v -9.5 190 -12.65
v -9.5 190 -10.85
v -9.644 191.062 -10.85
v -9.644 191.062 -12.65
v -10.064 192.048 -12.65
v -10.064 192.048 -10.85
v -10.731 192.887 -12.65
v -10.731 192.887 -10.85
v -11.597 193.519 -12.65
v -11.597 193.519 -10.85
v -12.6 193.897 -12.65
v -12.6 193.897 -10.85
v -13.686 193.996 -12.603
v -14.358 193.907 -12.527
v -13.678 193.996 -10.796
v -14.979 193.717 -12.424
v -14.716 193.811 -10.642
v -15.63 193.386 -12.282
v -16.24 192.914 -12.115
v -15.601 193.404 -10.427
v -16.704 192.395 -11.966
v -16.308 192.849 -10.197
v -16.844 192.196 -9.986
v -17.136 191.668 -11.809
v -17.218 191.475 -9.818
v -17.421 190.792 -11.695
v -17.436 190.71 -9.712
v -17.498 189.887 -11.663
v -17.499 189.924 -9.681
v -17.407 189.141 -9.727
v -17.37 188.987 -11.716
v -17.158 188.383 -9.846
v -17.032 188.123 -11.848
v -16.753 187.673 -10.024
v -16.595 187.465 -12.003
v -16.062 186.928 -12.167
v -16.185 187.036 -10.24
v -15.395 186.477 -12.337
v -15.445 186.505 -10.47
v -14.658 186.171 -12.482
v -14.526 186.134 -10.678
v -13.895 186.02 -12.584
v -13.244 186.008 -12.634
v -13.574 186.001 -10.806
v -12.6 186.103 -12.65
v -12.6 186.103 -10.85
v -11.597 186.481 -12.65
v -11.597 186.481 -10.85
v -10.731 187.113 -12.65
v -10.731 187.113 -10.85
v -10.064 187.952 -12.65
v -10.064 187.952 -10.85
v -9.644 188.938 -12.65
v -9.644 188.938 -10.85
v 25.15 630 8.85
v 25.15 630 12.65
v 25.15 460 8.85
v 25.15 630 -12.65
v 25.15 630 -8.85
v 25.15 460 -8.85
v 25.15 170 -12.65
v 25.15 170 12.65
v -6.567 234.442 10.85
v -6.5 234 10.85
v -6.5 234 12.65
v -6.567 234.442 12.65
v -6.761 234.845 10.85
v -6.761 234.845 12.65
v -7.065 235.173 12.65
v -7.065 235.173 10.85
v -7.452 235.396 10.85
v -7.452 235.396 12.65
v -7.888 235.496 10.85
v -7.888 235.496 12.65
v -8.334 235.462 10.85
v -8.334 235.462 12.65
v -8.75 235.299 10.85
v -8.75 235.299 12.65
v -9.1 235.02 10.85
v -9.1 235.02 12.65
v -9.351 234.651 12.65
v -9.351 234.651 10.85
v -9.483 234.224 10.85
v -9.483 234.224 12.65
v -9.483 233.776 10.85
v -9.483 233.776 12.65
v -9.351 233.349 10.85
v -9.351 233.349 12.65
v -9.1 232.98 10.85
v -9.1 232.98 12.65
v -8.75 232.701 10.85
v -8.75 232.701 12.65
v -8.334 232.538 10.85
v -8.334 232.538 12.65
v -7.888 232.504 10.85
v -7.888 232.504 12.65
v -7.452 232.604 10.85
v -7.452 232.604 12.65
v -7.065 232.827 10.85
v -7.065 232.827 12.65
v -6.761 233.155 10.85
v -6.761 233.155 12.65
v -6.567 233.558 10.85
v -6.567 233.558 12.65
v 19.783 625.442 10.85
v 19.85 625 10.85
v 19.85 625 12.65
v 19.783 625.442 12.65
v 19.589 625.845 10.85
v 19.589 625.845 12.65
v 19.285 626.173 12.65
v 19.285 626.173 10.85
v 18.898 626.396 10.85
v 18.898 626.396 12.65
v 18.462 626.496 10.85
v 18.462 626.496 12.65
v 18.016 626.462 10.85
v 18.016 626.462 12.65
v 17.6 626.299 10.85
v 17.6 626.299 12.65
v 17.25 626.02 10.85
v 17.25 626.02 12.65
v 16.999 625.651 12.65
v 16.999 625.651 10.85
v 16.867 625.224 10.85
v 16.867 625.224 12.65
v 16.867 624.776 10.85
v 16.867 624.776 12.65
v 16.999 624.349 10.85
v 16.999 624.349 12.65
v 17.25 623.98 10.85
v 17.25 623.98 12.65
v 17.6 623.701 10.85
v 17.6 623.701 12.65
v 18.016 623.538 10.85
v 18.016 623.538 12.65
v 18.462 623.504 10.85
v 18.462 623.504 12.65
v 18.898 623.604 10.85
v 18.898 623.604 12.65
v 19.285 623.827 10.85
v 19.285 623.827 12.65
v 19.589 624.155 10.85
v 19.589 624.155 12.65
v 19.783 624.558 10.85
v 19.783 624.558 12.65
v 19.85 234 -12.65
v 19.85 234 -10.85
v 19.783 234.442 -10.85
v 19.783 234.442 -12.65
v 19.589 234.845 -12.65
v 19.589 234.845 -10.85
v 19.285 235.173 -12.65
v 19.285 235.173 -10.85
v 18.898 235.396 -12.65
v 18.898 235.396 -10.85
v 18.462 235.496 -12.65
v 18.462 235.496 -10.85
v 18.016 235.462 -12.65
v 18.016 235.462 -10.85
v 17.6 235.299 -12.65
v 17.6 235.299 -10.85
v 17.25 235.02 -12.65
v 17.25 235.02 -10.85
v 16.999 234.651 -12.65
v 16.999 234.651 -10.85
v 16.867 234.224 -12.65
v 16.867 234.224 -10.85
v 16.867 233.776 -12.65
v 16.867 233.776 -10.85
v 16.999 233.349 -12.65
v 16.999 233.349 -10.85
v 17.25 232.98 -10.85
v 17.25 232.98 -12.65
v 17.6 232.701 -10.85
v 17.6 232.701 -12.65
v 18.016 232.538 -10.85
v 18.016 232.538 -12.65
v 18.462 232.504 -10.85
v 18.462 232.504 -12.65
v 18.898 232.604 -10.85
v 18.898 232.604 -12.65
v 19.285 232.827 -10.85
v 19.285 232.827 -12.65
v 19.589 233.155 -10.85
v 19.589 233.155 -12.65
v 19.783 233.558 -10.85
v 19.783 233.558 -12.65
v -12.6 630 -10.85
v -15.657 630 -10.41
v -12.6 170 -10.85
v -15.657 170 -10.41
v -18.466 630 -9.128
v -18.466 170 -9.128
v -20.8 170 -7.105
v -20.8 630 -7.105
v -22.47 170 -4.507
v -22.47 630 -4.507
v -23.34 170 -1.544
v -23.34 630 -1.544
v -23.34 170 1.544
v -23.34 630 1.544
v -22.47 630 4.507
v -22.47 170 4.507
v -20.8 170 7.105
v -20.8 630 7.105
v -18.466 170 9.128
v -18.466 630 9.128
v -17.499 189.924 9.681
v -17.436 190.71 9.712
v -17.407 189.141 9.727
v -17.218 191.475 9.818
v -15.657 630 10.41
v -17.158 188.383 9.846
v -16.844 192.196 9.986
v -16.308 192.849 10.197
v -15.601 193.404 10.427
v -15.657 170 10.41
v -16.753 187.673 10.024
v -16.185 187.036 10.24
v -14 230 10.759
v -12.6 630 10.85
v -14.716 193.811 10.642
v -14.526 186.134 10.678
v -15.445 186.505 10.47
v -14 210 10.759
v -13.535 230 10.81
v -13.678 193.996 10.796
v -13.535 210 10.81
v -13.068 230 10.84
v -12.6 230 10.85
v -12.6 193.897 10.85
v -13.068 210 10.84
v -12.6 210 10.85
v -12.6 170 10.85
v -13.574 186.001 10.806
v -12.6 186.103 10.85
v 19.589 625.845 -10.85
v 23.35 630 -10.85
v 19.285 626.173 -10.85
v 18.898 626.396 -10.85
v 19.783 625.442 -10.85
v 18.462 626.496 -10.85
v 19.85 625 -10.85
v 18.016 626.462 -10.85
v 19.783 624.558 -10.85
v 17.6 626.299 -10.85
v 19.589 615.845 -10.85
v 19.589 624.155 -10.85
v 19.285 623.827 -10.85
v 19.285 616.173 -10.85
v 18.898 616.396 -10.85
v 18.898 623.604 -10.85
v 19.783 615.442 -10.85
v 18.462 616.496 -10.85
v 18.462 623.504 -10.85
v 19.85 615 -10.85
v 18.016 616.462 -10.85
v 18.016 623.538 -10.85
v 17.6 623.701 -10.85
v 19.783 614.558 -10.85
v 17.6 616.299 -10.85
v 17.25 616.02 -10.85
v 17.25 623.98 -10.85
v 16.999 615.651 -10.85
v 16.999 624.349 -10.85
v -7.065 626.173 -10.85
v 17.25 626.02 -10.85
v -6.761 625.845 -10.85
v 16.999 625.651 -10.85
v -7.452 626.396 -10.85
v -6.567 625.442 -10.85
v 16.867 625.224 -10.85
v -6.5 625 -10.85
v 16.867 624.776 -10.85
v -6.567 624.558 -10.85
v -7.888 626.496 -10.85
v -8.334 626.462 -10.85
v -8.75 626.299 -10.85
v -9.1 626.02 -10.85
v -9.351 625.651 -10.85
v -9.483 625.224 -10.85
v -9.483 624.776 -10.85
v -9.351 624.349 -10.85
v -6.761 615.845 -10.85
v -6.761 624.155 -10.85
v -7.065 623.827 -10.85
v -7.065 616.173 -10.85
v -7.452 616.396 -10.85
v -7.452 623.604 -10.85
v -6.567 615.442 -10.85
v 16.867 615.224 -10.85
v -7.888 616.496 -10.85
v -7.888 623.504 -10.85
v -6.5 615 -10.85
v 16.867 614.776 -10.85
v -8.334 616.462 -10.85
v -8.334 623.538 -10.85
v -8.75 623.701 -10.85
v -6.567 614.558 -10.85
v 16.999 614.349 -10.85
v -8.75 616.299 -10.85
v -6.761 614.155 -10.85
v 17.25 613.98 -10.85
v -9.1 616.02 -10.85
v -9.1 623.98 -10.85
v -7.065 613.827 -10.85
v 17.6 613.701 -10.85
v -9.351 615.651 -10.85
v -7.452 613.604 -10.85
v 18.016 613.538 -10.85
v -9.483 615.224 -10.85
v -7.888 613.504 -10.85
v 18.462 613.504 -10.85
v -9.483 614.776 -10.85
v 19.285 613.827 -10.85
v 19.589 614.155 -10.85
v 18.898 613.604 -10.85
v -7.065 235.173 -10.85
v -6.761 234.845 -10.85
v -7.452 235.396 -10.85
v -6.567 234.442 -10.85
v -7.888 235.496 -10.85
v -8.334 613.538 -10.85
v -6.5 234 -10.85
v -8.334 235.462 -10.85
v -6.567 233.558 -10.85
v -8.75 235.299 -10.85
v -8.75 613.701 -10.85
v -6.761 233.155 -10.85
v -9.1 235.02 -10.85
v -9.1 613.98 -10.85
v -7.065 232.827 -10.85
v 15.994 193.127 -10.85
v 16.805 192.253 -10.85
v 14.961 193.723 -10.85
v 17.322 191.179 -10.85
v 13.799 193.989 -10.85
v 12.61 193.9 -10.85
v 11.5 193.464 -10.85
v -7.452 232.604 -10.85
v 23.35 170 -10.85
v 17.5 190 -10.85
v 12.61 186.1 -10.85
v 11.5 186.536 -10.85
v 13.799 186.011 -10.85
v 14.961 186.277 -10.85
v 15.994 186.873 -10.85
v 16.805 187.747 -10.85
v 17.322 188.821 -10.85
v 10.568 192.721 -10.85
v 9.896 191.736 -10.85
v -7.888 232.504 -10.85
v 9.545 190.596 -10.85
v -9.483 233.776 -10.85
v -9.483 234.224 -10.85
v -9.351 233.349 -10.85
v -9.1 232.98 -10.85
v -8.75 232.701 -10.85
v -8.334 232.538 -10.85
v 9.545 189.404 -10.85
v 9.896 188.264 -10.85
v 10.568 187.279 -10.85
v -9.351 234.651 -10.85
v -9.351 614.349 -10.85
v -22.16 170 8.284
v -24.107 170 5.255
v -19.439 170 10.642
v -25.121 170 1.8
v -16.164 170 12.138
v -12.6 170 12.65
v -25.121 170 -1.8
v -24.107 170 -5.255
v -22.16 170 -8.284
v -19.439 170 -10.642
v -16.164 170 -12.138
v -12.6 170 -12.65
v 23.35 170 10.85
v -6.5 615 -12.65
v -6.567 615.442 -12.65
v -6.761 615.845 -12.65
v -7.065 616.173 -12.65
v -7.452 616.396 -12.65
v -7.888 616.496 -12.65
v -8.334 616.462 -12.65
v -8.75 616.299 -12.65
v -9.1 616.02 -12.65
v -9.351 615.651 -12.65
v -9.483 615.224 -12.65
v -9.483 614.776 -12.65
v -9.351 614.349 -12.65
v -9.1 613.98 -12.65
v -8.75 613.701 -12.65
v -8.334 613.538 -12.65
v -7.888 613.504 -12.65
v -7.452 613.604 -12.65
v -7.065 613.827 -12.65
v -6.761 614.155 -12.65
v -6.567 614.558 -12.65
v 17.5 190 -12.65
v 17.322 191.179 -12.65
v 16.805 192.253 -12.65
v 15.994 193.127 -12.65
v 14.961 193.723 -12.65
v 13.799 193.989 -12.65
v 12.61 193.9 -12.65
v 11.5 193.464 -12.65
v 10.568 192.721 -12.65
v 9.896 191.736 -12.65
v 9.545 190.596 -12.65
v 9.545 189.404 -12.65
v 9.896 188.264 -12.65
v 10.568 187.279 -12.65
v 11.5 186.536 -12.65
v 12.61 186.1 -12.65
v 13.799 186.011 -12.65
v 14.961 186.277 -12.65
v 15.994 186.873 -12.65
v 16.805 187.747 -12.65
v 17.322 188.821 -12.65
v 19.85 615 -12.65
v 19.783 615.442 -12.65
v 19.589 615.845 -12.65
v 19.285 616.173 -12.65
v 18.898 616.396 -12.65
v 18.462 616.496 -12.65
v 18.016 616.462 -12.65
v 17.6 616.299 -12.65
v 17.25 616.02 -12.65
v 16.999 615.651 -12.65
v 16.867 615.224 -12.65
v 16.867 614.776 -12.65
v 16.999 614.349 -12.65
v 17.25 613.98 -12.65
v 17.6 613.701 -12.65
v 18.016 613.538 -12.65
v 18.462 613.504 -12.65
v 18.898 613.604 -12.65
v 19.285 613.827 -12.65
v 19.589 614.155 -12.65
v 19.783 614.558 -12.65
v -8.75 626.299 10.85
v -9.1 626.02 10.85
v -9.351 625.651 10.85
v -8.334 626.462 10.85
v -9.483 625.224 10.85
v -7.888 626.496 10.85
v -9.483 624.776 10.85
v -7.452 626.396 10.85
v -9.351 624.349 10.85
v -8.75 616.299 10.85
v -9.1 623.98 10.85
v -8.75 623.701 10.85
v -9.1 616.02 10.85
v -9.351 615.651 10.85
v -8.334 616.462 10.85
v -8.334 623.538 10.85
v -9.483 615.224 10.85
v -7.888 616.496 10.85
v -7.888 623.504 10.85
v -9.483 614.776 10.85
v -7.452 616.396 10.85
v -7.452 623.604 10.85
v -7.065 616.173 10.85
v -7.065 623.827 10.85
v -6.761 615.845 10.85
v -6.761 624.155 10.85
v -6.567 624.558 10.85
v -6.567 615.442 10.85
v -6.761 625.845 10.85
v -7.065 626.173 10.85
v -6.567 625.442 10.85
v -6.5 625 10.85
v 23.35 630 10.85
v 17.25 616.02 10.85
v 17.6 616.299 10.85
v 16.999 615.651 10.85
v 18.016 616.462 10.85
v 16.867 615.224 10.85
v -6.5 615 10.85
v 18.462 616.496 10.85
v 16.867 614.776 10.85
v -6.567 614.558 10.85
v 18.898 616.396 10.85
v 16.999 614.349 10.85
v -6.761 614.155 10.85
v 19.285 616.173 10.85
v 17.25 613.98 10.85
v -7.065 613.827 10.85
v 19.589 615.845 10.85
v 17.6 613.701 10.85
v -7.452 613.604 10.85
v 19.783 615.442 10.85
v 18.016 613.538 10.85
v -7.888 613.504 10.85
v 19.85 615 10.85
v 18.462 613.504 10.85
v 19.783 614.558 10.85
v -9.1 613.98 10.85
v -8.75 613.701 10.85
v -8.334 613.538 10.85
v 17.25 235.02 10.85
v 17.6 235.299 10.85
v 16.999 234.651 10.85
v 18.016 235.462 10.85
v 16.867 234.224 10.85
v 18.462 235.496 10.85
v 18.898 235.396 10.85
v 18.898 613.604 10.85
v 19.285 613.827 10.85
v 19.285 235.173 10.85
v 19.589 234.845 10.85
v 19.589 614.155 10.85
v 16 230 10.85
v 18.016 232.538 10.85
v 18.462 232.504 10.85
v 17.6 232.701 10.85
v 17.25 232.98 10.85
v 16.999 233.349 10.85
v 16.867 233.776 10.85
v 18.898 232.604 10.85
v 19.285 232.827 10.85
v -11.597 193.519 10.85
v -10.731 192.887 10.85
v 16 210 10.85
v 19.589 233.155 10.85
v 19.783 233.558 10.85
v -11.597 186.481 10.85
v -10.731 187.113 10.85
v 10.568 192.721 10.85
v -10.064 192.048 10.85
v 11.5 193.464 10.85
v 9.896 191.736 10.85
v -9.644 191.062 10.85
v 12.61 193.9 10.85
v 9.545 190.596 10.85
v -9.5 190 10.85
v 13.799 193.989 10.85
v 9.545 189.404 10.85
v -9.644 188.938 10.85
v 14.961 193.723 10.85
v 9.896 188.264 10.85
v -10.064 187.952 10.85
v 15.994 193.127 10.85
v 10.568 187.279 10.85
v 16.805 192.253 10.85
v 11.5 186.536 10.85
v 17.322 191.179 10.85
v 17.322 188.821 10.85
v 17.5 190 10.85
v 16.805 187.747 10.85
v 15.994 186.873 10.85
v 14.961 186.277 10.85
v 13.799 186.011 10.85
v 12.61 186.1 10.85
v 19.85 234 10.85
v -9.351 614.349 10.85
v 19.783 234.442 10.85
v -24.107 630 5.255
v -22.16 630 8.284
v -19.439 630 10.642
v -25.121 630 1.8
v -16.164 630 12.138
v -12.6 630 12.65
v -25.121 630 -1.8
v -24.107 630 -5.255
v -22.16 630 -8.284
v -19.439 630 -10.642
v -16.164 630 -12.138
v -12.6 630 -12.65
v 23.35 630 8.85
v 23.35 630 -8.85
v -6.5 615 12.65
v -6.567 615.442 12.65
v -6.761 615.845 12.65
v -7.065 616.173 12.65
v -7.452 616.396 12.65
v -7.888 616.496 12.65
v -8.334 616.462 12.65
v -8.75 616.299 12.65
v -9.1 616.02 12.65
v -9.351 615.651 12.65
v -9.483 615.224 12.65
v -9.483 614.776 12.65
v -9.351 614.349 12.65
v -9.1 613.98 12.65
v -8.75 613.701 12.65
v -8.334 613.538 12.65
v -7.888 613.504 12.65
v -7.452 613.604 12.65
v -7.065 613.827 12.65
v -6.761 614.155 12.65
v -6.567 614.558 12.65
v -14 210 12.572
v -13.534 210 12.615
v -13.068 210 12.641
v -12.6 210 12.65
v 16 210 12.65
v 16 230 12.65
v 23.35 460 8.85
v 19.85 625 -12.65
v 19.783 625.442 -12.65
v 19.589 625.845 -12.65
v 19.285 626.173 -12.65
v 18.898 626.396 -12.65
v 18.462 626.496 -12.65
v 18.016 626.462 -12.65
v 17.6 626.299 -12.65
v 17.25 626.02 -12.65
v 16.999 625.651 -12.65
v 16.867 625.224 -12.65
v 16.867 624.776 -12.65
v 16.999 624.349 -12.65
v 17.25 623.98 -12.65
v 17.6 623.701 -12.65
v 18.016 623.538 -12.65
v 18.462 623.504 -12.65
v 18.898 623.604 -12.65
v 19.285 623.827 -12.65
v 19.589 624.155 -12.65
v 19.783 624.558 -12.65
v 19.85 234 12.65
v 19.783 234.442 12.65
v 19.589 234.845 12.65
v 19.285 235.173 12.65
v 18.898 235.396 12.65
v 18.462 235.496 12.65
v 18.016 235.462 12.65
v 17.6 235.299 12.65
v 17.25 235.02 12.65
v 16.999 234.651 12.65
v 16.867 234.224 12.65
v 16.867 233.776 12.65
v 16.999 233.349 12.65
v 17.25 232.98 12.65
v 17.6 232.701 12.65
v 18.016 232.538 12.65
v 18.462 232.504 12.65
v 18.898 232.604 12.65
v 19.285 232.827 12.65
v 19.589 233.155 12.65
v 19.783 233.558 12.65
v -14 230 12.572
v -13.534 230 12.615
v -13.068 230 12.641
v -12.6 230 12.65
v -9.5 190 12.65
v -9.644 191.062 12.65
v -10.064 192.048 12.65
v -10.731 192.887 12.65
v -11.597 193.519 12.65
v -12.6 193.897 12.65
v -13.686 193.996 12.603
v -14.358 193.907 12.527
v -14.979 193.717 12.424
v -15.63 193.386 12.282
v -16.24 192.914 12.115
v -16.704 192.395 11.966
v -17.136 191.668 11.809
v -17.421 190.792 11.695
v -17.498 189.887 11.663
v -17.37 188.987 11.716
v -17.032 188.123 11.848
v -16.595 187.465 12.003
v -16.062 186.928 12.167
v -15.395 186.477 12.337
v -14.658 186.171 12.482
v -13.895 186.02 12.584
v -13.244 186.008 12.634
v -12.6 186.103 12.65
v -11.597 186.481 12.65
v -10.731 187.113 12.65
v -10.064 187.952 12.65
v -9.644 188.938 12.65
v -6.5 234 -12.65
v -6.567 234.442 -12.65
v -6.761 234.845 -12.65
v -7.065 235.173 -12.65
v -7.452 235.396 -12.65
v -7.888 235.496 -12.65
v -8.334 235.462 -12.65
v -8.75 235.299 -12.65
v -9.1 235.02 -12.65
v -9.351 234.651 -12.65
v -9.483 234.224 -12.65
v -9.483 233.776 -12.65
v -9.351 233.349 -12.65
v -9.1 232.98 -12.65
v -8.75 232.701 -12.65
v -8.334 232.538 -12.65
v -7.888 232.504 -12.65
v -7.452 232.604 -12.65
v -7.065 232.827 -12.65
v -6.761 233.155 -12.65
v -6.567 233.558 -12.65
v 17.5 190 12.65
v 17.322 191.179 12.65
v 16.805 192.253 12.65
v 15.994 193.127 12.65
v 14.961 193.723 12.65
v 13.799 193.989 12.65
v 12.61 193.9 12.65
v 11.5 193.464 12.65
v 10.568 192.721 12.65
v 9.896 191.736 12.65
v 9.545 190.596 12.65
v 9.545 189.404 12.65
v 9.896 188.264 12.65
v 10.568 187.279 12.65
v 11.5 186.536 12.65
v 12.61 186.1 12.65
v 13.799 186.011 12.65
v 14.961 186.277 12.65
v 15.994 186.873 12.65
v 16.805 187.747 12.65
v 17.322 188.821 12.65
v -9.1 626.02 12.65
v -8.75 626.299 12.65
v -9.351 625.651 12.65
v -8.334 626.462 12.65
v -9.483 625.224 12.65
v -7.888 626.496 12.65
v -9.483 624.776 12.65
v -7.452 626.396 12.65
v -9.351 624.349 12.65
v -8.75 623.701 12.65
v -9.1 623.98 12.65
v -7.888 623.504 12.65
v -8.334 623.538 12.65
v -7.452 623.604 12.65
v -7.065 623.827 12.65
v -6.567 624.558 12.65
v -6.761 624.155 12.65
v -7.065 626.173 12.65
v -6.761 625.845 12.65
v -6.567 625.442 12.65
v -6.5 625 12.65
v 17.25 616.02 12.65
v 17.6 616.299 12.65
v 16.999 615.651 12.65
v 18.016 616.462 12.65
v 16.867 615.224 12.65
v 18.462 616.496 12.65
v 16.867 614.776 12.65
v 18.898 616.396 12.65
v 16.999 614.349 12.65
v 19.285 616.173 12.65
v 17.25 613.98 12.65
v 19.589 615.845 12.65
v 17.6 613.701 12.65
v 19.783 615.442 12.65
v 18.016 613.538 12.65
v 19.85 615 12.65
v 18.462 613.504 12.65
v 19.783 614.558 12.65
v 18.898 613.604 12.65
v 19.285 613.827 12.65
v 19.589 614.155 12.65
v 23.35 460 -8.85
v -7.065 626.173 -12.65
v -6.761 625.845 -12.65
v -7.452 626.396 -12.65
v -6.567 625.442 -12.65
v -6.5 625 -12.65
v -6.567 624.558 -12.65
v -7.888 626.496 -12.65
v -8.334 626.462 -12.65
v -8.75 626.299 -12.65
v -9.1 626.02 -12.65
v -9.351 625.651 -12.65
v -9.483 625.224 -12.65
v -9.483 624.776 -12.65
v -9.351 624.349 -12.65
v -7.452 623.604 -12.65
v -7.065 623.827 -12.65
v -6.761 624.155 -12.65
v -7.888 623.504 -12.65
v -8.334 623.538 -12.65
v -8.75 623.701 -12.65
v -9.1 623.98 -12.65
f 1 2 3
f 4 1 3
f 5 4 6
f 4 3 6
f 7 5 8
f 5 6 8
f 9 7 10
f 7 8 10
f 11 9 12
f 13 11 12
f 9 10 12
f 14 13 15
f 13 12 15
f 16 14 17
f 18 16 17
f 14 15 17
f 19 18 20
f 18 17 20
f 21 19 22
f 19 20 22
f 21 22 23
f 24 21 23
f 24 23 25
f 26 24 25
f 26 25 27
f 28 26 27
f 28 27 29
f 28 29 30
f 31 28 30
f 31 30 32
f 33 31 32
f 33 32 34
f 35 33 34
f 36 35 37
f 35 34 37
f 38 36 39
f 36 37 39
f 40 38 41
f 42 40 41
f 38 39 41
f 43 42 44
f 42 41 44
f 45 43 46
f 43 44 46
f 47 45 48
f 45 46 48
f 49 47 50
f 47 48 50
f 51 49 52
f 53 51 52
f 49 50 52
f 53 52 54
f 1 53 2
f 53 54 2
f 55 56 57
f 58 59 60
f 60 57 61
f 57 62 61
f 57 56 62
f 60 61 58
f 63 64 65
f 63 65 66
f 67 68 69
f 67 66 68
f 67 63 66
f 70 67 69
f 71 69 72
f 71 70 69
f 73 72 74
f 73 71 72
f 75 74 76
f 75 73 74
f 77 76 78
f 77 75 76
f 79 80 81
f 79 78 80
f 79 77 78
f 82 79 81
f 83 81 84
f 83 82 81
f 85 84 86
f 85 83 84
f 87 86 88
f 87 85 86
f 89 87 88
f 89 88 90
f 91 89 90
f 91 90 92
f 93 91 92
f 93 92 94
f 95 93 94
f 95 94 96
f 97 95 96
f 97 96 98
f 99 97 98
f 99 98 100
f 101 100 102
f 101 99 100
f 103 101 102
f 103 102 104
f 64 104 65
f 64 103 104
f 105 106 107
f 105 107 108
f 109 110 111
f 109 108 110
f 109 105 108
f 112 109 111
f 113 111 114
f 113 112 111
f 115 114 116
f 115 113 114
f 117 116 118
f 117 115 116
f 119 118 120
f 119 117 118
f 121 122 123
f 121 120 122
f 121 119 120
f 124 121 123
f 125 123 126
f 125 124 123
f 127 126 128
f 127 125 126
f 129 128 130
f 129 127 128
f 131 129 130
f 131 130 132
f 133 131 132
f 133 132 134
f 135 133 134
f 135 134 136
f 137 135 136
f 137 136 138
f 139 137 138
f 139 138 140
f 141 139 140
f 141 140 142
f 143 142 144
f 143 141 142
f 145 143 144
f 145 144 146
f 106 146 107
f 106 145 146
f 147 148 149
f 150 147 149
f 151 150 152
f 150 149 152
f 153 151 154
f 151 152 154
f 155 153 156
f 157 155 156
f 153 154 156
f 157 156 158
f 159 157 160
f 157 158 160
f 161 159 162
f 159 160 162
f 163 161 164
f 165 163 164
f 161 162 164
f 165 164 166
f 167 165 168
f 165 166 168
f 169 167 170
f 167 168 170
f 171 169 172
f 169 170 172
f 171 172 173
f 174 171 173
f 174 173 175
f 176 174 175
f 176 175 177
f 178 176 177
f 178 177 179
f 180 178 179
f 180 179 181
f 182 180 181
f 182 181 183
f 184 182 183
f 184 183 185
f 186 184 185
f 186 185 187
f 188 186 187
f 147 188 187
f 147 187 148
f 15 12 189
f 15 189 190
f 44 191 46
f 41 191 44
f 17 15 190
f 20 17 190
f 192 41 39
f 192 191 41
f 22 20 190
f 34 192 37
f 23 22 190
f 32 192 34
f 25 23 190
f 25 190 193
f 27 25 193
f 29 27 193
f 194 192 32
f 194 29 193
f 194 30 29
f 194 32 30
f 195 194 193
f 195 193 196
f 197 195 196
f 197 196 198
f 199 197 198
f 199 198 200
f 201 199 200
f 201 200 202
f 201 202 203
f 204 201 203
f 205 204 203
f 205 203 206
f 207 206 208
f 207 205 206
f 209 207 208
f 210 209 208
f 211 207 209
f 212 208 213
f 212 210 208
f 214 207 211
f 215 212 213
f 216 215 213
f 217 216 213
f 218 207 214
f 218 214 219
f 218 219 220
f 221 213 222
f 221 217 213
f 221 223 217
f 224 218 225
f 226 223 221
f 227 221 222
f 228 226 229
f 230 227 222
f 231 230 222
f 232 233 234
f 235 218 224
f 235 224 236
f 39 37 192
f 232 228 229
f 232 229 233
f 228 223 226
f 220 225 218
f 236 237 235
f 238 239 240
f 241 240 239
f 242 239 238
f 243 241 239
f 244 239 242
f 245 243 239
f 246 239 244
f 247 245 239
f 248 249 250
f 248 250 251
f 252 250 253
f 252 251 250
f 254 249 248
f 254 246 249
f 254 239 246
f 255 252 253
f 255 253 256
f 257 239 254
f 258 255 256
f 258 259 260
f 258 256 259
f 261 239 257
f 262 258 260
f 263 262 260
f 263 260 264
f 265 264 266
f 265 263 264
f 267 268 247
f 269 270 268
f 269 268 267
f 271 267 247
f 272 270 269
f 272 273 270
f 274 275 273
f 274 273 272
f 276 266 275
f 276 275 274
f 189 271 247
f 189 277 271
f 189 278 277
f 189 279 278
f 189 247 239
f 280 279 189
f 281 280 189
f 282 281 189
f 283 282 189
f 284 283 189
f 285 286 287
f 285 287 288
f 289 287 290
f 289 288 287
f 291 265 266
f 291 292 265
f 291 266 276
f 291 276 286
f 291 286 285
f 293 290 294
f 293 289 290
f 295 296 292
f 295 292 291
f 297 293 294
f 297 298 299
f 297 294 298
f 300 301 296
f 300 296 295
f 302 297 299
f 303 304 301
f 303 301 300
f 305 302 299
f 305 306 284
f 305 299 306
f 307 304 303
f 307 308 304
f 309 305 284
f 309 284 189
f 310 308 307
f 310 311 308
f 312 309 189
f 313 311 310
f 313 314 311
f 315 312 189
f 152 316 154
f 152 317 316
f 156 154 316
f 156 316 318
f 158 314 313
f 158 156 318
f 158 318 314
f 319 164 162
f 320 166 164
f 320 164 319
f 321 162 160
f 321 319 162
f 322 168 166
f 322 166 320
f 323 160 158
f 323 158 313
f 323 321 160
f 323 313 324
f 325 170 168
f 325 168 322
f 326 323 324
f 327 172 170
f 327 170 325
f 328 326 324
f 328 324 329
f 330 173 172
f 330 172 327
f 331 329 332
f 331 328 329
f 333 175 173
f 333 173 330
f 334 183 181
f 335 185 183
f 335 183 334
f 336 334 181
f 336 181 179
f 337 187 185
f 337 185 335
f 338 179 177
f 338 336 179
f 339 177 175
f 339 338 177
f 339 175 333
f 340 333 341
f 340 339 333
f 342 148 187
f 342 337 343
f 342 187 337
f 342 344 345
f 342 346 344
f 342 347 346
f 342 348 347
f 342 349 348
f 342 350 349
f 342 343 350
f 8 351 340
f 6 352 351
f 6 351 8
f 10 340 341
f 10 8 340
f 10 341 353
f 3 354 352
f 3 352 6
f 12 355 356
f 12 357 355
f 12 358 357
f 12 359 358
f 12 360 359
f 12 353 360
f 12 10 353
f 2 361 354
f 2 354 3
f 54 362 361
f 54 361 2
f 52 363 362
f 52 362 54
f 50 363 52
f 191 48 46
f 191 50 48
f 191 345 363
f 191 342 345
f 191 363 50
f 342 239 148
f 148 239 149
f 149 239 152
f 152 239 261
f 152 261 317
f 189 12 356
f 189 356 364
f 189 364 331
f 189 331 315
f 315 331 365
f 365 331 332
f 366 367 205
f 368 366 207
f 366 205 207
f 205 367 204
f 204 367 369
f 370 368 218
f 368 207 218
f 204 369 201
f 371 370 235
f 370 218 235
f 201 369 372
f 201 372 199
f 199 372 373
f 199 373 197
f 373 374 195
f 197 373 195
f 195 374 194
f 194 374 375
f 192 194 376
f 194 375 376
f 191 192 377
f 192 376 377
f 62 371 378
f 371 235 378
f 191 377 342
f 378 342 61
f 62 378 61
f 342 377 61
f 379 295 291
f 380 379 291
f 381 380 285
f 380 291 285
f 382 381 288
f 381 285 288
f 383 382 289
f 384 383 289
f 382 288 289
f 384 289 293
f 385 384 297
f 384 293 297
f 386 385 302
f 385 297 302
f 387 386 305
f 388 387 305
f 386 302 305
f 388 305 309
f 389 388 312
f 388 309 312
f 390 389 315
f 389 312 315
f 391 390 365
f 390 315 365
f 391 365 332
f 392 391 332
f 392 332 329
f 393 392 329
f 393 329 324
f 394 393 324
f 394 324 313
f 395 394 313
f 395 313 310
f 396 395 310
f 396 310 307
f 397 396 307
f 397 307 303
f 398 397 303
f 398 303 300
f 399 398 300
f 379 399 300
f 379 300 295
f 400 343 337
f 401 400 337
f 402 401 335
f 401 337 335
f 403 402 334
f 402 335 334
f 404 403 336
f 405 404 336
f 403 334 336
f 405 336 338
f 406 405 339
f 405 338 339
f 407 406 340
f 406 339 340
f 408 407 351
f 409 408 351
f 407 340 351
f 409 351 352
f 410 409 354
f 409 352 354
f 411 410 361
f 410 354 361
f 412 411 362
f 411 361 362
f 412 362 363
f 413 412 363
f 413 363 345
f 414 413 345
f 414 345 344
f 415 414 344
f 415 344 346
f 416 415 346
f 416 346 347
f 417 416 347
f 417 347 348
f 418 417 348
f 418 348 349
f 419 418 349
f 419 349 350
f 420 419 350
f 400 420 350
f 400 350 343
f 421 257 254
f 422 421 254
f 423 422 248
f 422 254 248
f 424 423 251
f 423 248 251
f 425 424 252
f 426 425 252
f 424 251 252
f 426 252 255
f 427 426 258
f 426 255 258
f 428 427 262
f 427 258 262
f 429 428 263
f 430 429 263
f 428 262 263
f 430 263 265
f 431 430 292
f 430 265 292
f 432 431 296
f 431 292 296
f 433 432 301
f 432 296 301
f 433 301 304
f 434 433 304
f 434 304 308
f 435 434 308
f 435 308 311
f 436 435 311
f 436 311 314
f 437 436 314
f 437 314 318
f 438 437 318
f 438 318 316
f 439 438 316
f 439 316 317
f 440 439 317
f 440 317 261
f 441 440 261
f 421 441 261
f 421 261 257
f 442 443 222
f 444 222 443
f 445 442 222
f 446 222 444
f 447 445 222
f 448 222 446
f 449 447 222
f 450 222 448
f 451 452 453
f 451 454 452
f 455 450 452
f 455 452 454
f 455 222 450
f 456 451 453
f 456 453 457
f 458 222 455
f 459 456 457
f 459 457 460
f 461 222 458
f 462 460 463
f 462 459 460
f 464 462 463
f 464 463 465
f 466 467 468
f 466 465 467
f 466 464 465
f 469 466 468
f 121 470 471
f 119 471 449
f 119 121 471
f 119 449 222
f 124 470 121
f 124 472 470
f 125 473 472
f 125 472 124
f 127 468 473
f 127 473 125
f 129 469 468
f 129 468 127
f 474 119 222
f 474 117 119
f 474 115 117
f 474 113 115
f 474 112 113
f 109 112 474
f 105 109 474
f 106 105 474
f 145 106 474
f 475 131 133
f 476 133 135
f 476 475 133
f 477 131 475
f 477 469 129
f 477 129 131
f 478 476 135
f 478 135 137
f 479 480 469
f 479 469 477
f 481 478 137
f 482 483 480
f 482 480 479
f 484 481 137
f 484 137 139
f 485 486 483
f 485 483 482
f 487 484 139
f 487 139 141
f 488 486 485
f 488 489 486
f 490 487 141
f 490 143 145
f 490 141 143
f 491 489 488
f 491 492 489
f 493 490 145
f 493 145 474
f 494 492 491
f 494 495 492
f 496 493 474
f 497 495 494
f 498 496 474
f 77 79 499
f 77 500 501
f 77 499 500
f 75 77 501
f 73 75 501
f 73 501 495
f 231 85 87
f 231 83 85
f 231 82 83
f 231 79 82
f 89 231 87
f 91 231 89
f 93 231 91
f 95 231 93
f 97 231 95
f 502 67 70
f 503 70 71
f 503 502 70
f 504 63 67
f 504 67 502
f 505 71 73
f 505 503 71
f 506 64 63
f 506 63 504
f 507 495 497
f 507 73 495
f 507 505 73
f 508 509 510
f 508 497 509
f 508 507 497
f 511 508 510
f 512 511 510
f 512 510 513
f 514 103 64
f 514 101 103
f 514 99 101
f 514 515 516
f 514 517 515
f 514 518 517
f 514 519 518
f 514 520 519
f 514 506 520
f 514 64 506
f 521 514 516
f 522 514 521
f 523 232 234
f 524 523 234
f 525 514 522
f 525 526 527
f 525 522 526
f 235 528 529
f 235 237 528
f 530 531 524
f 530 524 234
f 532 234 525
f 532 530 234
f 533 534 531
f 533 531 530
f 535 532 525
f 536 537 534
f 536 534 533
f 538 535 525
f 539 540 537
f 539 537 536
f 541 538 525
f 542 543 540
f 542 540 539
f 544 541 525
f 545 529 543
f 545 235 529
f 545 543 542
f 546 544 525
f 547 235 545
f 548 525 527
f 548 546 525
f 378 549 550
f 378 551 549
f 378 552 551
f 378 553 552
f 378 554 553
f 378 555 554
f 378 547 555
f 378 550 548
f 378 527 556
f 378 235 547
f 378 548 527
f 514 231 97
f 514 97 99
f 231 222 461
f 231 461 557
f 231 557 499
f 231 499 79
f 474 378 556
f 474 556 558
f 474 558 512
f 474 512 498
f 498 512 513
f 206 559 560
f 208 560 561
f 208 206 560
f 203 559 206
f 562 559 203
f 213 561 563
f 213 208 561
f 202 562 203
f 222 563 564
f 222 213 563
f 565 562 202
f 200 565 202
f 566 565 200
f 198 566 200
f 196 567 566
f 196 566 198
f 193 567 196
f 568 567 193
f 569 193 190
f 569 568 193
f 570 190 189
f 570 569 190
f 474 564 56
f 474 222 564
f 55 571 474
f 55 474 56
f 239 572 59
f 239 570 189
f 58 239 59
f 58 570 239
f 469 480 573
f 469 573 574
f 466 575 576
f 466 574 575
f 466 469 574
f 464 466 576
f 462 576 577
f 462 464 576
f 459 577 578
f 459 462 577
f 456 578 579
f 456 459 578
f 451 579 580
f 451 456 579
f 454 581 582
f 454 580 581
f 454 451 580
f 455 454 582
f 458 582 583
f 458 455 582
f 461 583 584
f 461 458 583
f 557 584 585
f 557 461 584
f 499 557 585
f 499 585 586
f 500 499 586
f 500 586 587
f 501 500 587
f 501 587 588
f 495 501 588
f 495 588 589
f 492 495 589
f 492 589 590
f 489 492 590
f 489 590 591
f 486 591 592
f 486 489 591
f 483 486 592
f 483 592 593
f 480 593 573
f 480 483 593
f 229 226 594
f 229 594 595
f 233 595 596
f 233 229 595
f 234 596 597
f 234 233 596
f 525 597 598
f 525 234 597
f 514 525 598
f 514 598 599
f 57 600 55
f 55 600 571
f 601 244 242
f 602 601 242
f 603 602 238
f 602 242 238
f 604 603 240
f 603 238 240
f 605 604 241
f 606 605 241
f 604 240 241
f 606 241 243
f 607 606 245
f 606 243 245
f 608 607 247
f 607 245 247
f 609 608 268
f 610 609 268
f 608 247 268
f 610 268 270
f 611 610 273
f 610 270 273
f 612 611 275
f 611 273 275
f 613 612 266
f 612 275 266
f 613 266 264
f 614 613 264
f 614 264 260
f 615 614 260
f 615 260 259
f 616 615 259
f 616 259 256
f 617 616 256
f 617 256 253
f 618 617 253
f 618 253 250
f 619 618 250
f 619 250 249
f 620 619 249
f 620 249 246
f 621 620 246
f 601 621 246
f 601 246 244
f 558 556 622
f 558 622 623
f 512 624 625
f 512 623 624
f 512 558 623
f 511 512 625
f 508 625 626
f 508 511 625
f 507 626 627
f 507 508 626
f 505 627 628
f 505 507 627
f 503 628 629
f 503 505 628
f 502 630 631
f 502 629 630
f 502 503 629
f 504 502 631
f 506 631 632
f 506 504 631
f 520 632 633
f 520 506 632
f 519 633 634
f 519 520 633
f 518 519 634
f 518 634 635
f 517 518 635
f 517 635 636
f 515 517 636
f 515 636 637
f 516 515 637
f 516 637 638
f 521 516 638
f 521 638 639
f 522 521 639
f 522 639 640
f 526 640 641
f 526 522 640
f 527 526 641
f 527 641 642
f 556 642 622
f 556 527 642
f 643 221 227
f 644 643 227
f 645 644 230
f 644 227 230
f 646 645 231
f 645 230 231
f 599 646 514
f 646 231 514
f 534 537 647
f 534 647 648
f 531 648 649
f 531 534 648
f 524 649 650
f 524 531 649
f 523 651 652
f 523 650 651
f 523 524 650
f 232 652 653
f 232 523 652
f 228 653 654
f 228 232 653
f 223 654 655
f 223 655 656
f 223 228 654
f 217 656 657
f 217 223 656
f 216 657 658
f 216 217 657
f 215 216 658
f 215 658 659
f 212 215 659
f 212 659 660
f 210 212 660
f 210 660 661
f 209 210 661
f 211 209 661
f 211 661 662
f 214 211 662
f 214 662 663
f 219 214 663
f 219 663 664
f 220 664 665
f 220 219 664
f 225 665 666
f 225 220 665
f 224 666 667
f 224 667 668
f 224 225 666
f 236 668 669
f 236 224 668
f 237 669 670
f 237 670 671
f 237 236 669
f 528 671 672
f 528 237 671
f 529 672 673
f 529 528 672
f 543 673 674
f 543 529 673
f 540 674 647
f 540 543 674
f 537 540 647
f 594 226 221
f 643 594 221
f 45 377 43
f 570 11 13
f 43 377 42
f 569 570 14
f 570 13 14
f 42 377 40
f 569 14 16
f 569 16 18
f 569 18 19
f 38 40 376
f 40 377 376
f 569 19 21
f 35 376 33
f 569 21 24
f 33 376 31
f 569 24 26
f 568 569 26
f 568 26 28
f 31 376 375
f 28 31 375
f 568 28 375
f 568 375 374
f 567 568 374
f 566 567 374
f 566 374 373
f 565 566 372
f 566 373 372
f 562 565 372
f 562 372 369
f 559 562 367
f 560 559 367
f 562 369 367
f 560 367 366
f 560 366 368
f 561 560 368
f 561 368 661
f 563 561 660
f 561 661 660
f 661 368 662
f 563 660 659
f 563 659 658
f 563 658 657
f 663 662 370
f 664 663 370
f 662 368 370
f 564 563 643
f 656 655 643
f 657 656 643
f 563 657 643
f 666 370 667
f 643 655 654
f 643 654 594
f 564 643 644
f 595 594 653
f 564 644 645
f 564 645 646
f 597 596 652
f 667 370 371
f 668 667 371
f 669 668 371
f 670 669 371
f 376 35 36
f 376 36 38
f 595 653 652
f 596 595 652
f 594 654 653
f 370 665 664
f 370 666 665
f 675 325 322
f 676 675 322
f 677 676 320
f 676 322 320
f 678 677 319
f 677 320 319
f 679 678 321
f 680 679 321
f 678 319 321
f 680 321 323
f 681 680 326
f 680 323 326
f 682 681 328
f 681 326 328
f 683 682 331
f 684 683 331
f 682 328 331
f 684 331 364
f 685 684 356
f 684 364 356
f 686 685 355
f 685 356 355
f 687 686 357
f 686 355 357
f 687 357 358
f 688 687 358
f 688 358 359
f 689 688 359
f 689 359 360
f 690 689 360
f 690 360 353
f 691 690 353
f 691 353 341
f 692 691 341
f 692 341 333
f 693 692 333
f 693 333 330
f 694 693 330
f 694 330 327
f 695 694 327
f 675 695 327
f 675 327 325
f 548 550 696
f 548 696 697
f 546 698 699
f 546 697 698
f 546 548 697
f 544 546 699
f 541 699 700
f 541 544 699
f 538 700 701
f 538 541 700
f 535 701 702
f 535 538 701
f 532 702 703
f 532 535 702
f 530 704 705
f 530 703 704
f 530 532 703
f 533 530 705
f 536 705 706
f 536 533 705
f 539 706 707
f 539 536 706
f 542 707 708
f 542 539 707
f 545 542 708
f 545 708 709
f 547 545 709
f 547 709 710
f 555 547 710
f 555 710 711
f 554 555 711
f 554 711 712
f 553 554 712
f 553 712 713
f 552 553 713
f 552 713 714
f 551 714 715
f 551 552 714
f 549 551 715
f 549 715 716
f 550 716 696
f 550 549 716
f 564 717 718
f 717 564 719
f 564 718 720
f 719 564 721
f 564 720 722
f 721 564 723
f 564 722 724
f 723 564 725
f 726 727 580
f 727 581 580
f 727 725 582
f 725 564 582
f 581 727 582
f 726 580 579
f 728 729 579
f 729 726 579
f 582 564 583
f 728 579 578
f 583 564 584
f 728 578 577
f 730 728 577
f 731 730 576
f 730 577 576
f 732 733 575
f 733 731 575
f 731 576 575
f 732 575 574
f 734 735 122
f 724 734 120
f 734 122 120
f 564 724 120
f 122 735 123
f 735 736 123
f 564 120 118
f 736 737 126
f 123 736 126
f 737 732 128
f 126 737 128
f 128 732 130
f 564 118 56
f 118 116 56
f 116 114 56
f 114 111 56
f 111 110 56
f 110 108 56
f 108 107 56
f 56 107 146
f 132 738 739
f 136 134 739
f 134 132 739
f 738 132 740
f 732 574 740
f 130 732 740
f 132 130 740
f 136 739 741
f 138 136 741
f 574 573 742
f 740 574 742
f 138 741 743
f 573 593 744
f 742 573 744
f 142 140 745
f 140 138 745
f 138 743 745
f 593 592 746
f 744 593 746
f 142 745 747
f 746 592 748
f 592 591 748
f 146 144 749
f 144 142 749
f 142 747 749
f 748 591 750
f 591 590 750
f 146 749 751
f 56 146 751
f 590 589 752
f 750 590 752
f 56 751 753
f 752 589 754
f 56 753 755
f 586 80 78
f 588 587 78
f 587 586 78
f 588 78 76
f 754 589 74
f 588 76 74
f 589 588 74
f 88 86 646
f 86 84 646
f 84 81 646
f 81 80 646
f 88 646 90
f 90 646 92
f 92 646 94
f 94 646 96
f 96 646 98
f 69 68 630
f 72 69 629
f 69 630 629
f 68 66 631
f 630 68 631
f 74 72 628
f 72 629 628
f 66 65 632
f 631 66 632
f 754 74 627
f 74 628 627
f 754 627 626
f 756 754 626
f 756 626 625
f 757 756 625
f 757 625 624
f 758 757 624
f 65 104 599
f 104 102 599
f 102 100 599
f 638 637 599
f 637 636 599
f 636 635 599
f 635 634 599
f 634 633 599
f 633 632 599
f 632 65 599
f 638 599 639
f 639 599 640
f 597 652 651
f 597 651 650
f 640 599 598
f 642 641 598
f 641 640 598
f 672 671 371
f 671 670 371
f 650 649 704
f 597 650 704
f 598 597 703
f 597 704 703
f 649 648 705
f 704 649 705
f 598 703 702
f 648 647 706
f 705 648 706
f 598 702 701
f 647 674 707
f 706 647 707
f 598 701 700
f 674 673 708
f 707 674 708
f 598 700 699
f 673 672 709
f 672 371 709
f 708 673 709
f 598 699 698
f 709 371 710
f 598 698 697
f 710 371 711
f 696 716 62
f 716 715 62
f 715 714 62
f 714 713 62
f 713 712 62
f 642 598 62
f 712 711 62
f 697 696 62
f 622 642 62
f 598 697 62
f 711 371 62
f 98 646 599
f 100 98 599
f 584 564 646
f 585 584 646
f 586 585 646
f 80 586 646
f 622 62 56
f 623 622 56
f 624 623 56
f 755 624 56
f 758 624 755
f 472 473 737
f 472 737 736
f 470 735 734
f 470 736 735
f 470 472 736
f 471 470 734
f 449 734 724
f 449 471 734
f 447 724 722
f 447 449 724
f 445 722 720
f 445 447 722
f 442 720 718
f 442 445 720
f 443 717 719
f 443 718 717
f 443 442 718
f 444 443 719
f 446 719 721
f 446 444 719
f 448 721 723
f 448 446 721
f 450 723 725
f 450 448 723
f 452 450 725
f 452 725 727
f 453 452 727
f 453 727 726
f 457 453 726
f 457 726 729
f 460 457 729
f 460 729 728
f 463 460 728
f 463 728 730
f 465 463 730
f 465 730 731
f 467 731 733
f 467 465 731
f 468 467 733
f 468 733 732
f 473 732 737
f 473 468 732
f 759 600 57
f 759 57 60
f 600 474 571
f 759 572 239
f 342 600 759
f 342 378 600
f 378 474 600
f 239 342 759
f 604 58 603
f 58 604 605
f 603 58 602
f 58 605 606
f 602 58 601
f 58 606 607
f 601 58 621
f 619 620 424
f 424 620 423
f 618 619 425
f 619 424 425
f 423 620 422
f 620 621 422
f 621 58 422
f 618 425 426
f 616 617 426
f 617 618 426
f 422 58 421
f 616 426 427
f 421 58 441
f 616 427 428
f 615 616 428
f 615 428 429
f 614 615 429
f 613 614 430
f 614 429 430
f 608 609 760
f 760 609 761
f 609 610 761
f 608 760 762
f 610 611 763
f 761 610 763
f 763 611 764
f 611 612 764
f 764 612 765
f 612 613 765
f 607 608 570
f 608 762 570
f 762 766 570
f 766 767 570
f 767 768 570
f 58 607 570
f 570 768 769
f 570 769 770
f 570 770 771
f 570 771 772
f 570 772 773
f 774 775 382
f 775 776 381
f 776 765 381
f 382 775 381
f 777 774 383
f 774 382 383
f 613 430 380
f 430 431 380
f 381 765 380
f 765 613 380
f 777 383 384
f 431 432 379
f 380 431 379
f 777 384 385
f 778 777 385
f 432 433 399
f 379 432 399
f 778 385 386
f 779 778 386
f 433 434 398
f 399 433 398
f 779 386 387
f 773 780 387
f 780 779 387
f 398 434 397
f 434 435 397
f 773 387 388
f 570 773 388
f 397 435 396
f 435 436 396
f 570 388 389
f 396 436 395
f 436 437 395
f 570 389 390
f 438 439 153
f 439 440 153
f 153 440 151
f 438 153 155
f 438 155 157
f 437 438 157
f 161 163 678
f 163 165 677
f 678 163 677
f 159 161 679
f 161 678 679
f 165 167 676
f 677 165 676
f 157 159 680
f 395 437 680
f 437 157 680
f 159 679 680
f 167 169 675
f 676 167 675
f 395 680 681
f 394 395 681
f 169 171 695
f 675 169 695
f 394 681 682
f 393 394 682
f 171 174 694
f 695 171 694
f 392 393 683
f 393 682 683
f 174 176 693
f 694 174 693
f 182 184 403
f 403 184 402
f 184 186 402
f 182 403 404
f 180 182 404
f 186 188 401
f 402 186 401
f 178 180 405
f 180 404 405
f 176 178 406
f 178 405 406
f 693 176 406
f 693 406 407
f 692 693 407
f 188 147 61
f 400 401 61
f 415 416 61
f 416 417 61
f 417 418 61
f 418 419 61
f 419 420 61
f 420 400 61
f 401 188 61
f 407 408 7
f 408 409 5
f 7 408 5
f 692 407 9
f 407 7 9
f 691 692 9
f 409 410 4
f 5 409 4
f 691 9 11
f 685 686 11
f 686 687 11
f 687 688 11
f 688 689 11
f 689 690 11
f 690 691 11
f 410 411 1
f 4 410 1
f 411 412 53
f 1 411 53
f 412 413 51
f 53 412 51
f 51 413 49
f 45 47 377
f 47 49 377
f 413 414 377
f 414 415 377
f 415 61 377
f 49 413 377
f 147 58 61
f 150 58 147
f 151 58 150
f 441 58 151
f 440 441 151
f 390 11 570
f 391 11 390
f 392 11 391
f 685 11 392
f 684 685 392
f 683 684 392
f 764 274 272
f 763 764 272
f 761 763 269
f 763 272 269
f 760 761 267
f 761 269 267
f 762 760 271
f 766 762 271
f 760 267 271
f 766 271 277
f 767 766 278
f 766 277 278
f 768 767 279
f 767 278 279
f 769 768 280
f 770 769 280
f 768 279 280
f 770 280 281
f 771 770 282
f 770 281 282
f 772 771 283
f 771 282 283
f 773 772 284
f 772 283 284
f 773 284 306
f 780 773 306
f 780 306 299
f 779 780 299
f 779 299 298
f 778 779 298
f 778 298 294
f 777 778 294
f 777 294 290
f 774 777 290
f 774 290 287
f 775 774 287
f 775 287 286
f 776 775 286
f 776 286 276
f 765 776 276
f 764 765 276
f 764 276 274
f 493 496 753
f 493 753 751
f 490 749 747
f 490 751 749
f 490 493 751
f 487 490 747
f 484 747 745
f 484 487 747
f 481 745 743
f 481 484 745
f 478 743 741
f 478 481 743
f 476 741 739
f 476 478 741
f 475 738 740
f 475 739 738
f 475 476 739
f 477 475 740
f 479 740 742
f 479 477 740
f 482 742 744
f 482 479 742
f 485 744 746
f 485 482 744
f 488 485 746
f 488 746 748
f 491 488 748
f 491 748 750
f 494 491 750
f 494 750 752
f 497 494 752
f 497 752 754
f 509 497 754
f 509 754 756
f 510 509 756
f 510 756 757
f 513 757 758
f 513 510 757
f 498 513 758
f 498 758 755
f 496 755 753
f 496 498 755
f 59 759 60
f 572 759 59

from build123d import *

# Parameters (mm, degrees)
AUFSATZ_LINEAR_START                        = 170
AUFSATZ_LINEAR_AUSTRAGEN2_DEPTH             = 460
SCHNITT_LINEAR_AUSTRAGEN1_REACH             = 14.65
SKIZZE15_R                                  = 4
SCHNITT_LINEAR_AUSTRAGEN1_DIRECTION_2_REACH = 14.65
SKIZZE17_W                                  = 30
SKIZZE17_H                                  = 20
SCHNITT_LINEAR_AUSTRAGEN2_DEPTH             = 12.65
SKIZZE19_W                                  = 17.7
SKIZZE19_H                                  = 170
SCHNITT_LINEAR_AUSTRAGEN3_DEPTH             = 25.15
HOLES_R                                     = 1.5
SCHNITT_LINEAR_AUSTRAGEN5_DEPTH             = 13.6500001
SCHNITT_LINEAR_AUSTRAGEN5_DEPTH_BACK        = 13.6500001
SKIZZE23_R                                  = 1.5
SCHNITT_LINEAR_AUSTRAGEN7_DEPTH             = 13.6500001
SCHNITT_LINEAR_AUSTRAGEN7_DEPTH_BACK        = 13.6500001


with BuildPart() as part:
    # Skizze10 (on Top Plane) → Aufsatz-Linear austragen2 (new body)
    with BuildSketch(Plane(origin=(0, 0, 0), x_dir=(1, 0, 0), z_dir=(0, 1, 0)).offset(AUFSATZ_LINEAR_START)):
        with BuildLine():
            Line((25.15, 12.65), (-12.6, 12.65))
            ThreePointArc((-12.6, 12.65), (-25.25, 0), (-12.6, -12.65))
            Line((-12.6, -12.65), (25.15, -12.65))
            Line((25.15, -12.65), (25.15, 12.65))
        make_face()
        with BuildLine():
            Line((23.35, 10.85), (-12.6, 10.85))
            ThreePointArc((-12.6, 10.85), (-23.45, 0), (-12.6, -10.85))
            Line((-12.6, -10.85), (23.35, -10.85))
            Line((23.35, -10.85), (23.35, 10.85))
        make_face(mode=Mode.SUBTRACT)
    extrude(amount=AUFSATZ_LINEAR_AUSTRAGEN2_DEPTH)

    # Schnitt-Linear austragen1: up to this face of the body (flat: up to its plane)
    schnitt_linear_austragen1_end = Plane(part.part.faces().sort_by_distance((6.275, 400, -12.65))[0])
    # Skizze15 → Schnitt-Linear austragen1 (cut, up to the picked face)
    with BuildSketch(Plane.XY, mode=Mode.PRIVATE) as schnitt_linear_austragen1_sk1:
        with Locations((-13.5, 190)):
            Circle(SKIZZE15_R)
    schnitt_linear_austragen1_tool1 = split(extrude(schnitt_linear_austragen1_sk1.sketch, amount=-SCHNITT_LINEAR_AUSTRAGEN1_REACH, mode=Mode.PRIVATE), bisect_by=schnitt_linear_austragen1_end, keep=Keep.BOTH, mode=Mode.PRIVATE)
    add(schnitt_linear_austragen1_tool1.solids().sort_by_distance((-13.5, 190, 0))[0], mode=Mode.SUBTRACT)
    # Skizze15 → Schnitt-Linear austragen1 (cut, up to the picked face)
    with BuildSketch(Plane.XY, mode=Mode.PRIVATE) as schnitt_linear_austragen1_sk2:
        with Locations((13.5, 190)):
            Circle(SKIZZE15_R)
    schnitt_linear_austragen1_tool2 = split(extrude(schnitt_linear_austragen1_sk2.sketch, amount=-SCHNITT_LINEAR_AUSTRAGEN1_REACH, mode=Mode.PRIVATE), bisect_by=schnitt_linear_austragen1_end, keep=Keep.BOTH, mode=Mode.PRIVATE)
    add(schnitt_linear_austragen1_tool2.solids().sort_by_distance((13.5, 190, 0))[0], mode=Mode.SUBTRACT)

    # Schnitt-Linear austragen1 direction 2: up to this face of the body (flat: up to its plane)
    schnitt_linear_austragen1_direction_2_end = Plane(part.part.faces().sort_by_distance((6.275, 400, 12.65))[0])
    # Skizze15 → Schnitt-Linear austragen1 direction 2 (cut, up to the picked face)
    with BuildSketch(Plane.XY, mode=Mode.PRIVATE) as schnitt_linear_austragen1_direction_2_sk1:
        with Locations((-13.5, 190)):
            Circle(SKIZZE15_R)
    schnitt_linear_austragen1_direction_2_tool1 = split(extrude(schnitt_linear_austragen1_direction_2_sk1.sketch, amount=SCHNITT_LINEAR_AUSTRAGEN1_DIRECTION_2_REACH, mode=Mode.PRIVATE), bisect_by=schnitt_linear_austragen1_direction_2_end, keep=Keep.BOTH, mode=Mode.PRIVATE)
    add(schnitt_linear_austragen1_direction_2_tool1.solids().sort_by_distance((-13.5, 190, 0))[0], mode=Mode.SUBTRACT)
    # Skizze15 → Schnitt-Linear austragen1 direction 2 (cut, up to the picked face)
    with BuildSketch(Plane.XY, mode=Mode.PRIVATE) as schnitt_linear_austragen1_direction_2_sk2:
        with Locations((13.5, 190)):
            Circle(SKIZZE15_R)
    schnitt_linear_austragen1_direction_2_tool2 = split(extrude(schnitt_linear_austragen1_direction_2_sk2.sketch, amount=SCHNITT_LINEAR_AUSTRAGEN1_DIRECTION_2_REACH, mode=Mode.PRIVATE), bisect_by=schnitt_linear_austragen1_direction_2_end, keep=Keep.BOTH, mode=Mode.PRIVATE)
    add(schnitt_linear_austragen1_direction_2_tool2.solids().sort_by_distance((13.5, 190, 0))[0], mode=Mode.SUBTRACT)

    # Skizze17 → Schnitt-Linear austragen2 (cut)
    with BuildSketch(Plane.XY):
        with Locations((1, 220)):
            Rectangle(SKIZZE17_W, SKIZZE17_H)
    extrude(amount=SCHNITT_LINEAR_AUSTRAGEN2_DEPTH, mode=Mode.SUBTRACT)

    # Skizze19 → Schnitt-Linear austragen3 (cut)
    with BuildSketch(Plane(origin=(0, 0, 0), x_dir=(0, 0, -1), z_dir=(1, 0, 0))):
        with Locations((0, 545)):
            Rectangle(SKIZZE19_W, SKIZZE19_H)
    extrude(amount=SCHNITT_LINEAR_AUSTRAGEN3_DEPTH, mode=Mode.SUBTRACT)

    # Holes → Schnitt-Linear austragen5 (cut, two sides)
    with BuildSketch(Plane.XY) as schnitt_linear_austragen5_sk:
        with Locations((18.35, 615)):
            Circle(HOLES_R)
        with Locations((-8, 615)):
            Circle(HOLES_R)
        with Locations((18.35, 234)):
            Circle(HOLES_R)
        with Locations((-8, 234)):
            Circle(HOLES_R)
    extrude(amount=SCHNITT_LINEAR_AUSTRAGEN5_DEPTH, mode=Mode.SUBTRACT)
    extrude(schnitt_linear_austragen5_sk.sketch, amount=-SCHNITT_LINEAR_AUSTRAGEN5_DEPTH_BACK, mode=Mode.SUBTRACT)

    # Skizze23 → Schnitt-Linear austragen7 (cut, two sides)
    with BuildSketch(Plane.XY) as schnitt_linear_austragen7_sk:
        with Locations((-8, 625)):
            Circle(SKIZZE23_R)
        with Locations((18.35, 625)):
            Circle(SKIZZE23_R)
    extrude(amount=SCHNITT_LINEAR_AUSTRAGEN7_DEPTH, mode=Mode.SUBTRACT)
    extrude(schnitt_linear_austragen7_sk.sketch, amount=-SCHNITT_LINEAR_AUSTRAGEN7_DEPTH_BACK, mode=Mode.SUBTRACT)


solid = part.part
